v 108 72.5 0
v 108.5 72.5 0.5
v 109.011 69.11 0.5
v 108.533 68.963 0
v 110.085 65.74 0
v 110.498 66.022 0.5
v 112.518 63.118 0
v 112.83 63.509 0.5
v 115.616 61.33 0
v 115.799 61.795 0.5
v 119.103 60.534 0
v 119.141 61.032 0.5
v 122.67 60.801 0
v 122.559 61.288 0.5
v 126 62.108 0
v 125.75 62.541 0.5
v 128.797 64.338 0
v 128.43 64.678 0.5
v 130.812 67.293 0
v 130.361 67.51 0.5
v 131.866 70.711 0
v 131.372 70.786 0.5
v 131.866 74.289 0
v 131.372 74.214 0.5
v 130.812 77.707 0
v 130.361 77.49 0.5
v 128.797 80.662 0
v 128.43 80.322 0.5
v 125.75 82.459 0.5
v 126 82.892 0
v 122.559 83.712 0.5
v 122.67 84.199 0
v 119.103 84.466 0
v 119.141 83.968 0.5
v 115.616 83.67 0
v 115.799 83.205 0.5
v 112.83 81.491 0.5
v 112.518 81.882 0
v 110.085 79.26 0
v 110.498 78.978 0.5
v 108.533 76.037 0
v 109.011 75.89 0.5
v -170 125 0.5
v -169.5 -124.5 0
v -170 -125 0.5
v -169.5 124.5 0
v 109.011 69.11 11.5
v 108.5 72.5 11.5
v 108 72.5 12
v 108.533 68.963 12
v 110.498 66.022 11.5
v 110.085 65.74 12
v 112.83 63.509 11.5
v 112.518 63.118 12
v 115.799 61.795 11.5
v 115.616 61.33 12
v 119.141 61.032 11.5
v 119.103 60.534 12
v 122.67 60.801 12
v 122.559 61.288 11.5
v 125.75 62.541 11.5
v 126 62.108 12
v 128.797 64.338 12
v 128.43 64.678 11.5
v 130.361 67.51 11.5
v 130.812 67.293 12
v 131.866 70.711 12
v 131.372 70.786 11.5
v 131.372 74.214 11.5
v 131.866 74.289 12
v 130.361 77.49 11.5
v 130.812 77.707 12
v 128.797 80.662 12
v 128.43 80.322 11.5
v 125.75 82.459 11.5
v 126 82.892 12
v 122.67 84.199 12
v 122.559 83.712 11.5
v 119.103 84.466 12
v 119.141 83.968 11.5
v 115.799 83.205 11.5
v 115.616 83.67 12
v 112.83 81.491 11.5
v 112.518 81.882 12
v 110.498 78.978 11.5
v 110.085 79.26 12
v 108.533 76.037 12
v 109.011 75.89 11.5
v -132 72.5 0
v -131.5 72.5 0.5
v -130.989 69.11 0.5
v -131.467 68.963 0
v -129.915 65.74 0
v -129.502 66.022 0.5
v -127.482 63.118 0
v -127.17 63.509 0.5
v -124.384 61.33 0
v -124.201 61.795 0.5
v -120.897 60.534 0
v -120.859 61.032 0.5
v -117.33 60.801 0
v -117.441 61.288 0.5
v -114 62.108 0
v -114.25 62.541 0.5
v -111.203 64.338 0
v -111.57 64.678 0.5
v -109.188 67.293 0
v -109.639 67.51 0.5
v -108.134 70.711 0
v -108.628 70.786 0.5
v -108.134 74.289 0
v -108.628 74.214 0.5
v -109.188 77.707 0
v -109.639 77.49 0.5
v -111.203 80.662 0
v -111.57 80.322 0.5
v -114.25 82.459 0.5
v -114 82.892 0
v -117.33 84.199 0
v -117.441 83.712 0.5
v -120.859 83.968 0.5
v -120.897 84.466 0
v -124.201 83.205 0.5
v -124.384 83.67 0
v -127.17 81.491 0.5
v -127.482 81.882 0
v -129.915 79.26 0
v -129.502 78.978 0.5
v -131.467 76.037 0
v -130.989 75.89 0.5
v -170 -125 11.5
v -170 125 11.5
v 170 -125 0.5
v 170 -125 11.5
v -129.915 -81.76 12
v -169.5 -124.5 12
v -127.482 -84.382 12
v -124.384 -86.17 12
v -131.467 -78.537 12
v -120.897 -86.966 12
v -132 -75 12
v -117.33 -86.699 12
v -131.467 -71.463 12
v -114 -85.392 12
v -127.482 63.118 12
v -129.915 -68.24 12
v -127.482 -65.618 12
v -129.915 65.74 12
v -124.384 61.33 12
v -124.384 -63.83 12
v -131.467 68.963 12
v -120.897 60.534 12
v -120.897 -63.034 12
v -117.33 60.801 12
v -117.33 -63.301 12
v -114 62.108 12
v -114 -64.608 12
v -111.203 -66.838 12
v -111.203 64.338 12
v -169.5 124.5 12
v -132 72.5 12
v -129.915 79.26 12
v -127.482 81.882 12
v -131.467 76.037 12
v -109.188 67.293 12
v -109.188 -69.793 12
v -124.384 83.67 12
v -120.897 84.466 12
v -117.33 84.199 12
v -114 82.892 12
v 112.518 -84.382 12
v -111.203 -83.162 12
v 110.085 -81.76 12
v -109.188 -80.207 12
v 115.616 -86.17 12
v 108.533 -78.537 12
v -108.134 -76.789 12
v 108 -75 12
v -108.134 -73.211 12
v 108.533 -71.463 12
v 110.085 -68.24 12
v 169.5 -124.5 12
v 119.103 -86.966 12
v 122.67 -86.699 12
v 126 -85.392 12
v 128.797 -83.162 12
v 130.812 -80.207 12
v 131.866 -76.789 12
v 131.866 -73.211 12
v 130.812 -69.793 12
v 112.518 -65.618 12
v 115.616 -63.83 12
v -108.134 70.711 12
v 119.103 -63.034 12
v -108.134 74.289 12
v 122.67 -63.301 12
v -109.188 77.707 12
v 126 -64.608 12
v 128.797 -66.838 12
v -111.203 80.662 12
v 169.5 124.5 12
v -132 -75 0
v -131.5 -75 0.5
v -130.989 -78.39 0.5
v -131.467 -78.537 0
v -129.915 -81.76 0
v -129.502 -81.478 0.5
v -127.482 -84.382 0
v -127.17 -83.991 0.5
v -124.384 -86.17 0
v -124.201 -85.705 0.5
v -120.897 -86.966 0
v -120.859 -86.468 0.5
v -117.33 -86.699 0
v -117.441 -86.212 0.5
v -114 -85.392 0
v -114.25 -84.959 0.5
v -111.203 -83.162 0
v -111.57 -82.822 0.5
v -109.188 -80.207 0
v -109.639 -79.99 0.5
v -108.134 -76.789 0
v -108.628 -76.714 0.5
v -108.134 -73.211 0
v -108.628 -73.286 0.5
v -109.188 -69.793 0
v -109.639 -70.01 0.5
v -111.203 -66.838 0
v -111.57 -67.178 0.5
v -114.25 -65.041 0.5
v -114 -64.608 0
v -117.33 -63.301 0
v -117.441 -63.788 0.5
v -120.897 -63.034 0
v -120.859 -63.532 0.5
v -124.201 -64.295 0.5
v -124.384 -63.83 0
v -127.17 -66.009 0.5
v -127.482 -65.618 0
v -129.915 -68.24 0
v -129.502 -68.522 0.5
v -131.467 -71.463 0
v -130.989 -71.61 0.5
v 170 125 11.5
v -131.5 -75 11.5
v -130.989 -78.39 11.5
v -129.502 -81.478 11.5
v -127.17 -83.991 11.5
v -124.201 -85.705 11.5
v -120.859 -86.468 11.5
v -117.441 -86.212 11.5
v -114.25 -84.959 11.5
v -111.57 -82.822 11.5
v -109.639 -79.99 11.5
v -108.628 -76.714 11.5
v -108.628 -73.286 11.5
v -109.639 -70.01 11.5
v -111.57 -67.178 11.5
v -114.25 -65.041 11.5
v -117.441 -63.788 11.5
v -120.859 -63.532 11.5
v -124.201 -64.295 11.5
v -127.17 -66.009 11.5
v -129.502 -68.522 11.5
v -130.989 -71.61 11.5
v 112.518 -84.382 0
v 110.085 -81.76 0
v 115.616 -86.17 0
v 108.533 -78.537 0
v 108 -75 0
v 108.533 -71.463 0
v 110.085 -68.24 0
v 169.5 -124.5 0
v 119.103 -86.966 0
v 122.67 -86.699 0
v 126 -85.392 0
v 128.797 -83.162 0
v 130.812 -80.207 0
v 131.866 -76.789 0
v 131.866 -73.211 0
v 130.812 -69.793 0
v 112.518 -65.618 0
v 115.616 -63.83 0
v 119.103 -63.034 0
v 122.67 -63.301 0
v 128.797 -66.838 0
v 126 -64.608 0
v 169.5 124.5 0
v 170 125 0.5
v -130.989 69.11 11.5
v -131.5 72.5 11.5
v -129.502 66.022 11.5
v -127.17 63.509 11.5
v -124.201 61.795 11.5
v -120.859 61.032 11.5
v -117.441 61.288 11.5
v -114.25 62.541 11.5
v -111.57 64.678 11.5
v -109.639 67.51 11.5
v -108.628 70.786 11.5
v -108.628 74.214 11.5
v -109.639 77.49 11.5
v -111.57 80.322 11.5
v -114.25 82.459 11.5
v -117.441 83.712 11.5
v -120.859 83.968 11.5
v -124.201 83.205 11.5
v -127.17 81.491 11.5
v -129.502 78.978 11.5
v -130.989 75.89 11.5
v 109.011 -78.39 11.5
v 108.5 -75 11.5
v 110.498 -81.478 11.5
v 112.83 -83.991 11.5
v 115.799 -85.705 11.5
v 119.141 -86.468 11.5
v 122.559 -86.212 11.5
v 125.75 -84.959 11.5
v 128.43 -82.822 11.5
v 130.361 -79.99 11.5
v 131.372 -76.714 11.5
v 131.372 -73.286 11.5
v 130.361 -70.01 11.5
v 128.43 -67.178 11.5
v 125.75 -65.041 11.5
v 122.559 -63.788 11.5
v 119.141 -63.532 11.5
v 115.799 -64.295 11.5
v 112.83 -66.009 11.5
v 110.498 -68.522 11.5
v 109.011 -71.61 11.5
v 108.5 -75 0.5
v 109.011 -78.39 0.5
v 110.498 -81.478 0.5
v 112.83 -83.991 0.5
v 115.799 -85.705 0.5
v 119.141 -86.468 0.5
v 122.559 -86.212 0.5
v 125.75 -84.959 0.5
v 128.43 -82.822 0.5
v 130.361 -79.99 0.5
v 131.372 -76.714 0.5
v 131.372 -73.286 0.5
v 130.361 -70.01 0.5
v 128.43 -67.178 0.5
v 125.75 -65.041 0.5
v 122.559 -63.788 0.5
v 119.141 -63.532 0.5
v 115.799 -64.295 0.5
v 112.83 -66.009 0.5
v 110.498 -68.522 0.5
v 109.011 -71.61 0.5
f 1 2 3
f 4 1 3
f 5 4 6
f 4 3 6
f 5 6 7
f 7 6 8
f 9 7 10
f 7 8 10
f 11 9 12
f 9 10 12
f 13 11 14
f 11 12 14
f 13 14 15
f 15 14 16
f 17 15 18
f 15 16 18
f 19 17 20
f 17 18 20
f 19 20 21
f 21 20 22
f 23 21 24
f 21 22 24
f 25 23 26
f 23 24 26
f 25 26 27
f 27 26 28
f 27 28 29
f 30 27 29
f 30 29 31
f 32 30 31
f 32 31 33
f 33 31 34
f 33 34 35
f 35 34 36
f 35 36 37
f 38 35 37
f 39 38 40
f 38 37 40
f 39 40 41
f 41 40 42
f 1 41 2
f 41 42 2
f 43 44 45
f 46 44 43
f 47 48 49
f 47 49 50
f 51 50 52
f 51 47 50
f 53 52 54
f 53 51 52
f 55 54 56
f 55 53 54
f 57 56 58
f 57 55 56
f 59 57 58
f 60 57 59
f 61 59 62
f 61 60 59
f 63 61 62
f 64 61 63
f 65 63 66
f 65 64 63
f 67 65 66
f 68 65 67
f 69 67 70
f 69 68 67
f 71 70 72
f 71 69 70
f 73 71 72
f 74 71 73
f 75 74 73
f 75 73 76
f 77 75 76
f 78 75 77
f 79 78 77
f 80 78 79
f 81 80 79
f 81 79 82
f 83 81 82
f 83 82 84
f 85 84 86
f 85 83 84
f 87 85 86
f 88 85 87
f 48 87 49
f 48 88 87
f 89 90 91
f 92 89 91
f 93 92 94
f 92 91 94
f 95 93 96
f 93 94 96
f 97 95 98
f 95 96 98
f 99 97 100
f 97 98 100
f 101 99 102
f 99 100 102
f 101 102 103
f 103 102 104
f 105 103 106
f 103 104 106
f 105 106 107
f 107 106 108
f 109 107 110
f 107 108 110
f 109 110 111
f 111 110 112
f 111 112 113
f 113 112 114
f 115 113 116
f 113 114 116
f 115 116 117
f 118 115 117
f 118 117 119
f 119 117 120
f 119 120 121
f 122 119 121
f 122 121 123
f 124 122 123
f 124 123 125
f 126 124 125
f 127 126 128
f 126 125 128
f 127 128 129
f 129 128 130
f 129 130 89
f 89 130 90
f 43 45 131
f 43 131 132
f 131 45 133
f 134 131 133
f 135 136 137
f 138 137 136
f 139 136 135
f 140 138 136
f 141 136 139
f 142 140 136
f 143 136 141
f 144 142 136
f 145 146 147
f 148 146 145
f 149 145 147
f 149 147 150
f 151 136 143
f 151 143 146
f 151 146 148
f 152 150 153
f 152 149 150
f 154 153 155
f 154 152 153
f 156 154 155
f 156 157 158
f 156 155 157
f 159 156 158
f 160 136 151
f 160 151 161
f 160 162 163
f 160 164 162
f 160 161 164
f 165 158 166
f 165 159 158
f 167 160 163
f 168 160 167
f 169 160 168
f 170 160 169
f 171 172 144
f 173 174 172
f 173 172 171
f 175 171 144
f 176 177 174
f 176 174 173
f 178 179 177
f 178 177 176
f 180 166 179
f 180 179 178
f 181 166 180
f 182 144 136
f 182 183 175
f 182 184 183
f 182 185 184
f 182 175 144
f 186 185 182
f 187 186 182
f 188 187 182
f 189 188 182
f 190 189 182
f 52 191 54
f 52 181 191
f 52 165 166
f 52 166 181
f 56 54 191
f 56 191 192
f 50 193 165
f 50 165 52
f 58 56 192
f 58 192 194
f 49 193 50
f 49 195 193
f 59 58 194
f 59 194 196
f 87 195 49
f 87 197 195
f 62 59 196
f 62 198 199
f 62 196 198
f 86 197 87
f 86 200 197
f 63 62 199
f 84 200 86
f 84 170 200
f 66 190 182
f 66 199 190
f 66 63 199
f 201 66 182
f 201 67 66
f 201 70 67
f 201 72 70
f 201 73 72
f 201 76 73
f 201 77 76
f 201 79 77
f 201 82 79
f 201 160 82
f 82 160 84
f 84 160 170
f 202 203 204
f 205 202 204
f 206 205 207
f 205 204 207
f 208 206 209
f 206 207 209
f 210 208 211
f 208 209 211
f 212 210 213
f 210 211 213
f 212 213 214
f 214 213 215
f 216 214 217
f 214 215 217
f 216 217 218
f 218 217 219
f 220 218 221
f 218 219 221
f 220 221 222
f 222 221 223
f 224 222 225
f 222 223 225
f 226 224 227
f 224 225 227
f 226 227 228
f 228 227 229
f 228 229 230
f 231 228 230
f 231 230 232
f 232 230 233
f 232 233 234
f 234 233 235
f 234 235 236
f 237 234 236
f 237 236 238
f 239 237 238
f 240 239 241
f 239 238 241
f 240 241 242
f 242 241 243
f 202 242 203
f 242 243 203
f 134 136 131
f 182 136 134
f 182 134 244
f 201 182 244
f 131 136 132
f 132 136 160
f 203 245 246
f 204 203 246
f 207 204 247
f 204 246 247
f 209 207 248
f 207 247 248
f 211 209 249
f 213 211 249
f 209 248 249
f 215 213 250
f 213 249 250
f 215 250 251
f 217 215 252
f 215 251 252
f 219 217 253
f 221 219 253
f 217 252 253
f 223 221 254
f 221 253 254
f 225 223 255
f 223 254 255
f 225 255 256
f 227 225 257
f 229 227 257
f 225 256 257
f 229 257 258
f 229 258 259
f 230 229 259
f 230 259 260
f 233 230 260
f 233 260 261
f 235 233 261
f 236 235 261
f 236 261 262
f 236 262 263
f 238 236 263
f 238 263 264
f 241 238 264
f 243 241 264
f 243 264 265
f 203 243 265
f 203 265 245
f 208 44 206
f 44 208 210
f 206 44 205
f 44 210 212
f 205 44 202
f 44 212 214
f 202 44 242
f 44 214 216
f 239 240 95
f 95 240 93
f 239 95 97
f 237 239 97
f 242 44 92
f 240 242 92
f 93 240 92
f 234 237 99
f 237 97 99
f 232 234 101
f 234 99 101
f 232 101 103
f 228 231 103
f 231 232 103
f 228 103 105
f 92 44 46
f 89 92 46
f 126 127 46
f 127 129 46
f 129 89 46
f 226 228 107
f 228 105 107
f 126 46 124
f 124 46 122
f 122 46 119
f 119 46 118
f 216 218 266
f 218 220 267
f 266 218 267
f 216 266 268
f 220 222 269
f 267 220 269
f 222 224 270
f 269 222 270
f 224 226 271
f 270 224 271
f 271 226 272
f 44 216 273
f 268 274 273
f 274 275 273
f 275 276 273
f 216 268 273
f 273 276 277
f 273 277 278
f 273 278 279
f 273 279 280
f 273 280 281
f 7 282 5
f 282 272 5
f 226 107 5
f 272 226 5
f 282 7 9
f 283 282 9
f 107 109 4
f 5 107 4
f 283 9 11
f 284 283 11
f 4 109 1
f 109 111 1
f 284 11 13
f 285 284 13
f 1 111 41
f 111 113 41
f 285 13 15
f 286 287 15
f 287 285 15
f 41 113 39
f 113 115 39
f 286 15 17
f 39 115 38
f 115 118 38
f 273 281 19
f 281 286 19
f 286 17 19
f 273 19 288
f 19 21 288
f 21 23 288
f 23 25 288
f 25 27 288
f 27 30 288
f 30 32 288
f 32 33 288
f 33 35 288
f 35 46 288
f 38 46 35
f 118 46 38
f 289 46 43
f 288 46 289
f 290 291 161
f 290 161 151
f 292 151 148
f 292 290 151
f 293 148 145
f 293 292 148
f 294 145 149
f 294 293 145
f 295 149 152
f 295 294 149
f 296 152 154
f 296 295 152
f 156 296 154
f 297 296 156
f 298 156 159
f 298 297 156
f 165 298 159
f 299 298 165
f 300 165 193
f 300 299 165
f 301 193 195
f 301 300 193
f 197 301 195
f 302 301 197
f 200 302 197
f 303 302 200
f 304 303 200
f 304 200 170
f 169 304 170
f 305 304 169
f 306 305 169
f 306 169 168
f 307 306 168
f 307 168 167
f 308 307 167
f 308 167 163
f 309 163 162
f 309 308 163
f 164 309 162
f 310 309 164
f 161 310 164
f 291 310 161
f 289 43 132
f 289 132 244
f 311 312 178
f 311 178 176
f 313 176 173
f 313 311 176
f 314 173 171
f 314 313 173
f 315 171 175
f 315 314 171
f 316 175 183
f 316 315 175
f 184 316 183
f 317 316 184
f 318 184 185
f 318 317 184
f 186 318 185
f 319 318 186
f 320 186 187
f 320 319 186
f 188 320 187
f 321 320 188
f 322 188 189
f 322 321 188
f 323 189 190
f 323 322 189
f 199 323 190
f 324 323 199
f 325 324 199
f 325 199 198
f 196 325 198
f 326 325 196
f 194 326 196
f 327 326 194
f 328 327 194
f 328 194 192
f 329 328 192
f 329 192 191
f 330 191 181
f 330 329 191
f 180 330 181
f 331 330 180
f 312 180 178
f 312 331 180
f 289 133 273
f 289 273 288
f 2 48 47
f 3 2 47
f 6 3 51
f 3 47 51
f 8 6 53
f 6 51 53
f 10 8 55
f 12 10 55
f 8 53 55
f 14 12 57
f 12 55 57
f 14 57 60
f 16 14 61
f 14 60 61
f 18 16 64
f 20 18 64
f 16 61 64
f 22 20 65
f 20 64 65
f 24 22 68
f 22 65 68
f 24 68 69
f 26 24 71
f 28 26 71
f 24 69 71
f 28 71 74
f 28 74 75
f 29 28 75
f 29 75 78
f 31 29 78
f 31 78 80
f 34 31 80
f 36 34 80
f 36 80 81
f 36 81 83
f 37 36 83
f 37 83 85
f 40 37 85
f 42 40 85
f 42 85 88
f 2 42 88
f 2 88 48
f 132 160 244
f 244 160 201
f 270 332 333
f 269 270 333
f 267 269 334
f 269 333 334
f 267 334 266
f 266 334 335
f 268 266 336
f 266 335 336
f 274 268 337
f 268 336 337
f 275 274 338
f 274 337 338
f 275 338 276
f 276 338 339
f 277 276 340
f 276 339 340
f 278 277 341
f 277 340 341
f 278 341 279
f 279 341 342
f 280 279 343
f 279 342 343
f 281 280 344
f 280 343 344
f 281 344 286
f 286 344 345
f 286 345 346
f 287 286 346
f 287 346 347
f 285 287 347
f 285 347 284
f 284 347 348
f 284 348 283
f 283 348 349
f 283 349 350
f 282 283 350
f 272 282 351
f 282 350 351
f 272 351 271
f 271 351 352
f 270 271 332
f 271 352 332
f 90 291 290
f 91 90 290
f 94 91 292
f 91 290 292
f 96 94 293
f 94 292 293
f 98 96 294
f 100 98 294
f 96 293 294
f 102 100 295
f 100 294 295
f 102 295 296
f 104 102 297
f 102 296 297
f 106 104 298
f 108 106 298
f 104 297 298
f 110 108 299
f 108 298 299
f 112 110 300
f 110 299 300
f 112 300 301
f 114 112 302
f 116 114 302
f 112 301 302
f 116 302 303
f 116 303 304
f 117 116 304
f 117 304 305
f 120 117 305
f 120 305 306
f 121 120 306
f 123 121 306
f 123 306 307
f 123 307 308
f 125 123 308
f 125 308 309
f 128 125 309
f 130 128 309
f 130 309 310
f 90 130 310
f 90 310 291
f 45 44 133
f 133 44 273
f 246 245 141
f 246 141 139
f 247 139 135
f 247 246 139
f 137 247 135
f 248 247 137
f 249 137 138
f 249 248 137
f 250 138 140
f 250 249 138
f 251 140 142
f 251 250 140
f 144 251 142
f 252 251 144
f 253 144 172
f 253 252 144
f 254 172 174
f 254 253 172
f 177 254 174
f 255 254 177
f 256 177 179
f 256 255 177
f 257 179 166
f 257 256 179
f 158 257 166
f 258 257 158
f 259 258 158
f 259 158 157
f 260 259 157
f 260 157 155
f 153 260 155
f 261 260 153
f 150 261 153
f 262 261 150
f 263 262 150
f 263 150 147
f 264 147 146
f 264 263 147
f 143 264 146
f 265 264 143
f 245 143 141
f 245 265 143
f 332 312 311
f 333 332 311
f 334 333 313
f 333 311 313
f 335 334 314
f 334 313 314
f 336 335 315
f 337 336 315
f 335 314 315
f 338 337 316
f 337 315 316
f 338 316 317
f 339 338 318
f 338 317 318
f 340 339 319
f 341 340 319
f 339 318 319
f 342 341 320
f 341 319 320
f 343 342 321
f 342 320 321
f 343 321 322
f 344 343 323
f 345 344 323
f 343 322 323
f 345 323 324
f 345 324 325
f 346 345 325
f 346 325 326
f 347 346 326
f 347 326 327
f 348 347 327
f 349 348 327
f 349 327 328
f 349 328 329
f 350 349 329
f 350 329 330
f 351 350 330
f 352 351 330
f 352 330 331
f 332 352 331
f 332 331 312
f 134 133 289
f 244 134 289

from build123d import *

# Parameters (mm, degrees)
F0_W     = 340
F0_H     = 250
F1_DEPTH = 12
F2_D     = 23
F3_SIZE  = 0.5


with BuildPart() as f1:
    # F0 (on Top) → F1 (new body)
    with BuildSketch(Plane.XY):
        Rectangle(F0_W, F0_H)
    extrude(amount=F1_DEPTH)

    # F2 (through all)
    with Locations(Plane(origin=(0, 0, 0), x_dir=(1, 0, 0), z_dir=(0, 0, -1))):
        with Locations((120, -72.5), (120, 75), (-120, 75), (-120, -72.5)):
            Hole(F2_D / 2)

    # F3
    f3_edges = [f1.edges().sort_by_distance(p)[0] for p in [
        (170, 0, 12),
        (0, -125, 12),
        (0, 125, 12),
        (-170, 0, 12),
        (-131.5, -75, 12),
        (108.5, -75, 12),
        (-131.5, 72.5, 12),
        (108.5, 72.5, 12),
        (170, 0, 0),
        (0, -125, 0),
        (0, 125, 0),
        (-170, 0, 0),
        (-131.5, -75, 0),
        (108.5, -75, 0),
        (-131.5, 72.5, 0),
        (108.5, 72.5, 0),
    ]]
    chamfer(f3_edges, length=F3_SIZE)


solid = f1.part
